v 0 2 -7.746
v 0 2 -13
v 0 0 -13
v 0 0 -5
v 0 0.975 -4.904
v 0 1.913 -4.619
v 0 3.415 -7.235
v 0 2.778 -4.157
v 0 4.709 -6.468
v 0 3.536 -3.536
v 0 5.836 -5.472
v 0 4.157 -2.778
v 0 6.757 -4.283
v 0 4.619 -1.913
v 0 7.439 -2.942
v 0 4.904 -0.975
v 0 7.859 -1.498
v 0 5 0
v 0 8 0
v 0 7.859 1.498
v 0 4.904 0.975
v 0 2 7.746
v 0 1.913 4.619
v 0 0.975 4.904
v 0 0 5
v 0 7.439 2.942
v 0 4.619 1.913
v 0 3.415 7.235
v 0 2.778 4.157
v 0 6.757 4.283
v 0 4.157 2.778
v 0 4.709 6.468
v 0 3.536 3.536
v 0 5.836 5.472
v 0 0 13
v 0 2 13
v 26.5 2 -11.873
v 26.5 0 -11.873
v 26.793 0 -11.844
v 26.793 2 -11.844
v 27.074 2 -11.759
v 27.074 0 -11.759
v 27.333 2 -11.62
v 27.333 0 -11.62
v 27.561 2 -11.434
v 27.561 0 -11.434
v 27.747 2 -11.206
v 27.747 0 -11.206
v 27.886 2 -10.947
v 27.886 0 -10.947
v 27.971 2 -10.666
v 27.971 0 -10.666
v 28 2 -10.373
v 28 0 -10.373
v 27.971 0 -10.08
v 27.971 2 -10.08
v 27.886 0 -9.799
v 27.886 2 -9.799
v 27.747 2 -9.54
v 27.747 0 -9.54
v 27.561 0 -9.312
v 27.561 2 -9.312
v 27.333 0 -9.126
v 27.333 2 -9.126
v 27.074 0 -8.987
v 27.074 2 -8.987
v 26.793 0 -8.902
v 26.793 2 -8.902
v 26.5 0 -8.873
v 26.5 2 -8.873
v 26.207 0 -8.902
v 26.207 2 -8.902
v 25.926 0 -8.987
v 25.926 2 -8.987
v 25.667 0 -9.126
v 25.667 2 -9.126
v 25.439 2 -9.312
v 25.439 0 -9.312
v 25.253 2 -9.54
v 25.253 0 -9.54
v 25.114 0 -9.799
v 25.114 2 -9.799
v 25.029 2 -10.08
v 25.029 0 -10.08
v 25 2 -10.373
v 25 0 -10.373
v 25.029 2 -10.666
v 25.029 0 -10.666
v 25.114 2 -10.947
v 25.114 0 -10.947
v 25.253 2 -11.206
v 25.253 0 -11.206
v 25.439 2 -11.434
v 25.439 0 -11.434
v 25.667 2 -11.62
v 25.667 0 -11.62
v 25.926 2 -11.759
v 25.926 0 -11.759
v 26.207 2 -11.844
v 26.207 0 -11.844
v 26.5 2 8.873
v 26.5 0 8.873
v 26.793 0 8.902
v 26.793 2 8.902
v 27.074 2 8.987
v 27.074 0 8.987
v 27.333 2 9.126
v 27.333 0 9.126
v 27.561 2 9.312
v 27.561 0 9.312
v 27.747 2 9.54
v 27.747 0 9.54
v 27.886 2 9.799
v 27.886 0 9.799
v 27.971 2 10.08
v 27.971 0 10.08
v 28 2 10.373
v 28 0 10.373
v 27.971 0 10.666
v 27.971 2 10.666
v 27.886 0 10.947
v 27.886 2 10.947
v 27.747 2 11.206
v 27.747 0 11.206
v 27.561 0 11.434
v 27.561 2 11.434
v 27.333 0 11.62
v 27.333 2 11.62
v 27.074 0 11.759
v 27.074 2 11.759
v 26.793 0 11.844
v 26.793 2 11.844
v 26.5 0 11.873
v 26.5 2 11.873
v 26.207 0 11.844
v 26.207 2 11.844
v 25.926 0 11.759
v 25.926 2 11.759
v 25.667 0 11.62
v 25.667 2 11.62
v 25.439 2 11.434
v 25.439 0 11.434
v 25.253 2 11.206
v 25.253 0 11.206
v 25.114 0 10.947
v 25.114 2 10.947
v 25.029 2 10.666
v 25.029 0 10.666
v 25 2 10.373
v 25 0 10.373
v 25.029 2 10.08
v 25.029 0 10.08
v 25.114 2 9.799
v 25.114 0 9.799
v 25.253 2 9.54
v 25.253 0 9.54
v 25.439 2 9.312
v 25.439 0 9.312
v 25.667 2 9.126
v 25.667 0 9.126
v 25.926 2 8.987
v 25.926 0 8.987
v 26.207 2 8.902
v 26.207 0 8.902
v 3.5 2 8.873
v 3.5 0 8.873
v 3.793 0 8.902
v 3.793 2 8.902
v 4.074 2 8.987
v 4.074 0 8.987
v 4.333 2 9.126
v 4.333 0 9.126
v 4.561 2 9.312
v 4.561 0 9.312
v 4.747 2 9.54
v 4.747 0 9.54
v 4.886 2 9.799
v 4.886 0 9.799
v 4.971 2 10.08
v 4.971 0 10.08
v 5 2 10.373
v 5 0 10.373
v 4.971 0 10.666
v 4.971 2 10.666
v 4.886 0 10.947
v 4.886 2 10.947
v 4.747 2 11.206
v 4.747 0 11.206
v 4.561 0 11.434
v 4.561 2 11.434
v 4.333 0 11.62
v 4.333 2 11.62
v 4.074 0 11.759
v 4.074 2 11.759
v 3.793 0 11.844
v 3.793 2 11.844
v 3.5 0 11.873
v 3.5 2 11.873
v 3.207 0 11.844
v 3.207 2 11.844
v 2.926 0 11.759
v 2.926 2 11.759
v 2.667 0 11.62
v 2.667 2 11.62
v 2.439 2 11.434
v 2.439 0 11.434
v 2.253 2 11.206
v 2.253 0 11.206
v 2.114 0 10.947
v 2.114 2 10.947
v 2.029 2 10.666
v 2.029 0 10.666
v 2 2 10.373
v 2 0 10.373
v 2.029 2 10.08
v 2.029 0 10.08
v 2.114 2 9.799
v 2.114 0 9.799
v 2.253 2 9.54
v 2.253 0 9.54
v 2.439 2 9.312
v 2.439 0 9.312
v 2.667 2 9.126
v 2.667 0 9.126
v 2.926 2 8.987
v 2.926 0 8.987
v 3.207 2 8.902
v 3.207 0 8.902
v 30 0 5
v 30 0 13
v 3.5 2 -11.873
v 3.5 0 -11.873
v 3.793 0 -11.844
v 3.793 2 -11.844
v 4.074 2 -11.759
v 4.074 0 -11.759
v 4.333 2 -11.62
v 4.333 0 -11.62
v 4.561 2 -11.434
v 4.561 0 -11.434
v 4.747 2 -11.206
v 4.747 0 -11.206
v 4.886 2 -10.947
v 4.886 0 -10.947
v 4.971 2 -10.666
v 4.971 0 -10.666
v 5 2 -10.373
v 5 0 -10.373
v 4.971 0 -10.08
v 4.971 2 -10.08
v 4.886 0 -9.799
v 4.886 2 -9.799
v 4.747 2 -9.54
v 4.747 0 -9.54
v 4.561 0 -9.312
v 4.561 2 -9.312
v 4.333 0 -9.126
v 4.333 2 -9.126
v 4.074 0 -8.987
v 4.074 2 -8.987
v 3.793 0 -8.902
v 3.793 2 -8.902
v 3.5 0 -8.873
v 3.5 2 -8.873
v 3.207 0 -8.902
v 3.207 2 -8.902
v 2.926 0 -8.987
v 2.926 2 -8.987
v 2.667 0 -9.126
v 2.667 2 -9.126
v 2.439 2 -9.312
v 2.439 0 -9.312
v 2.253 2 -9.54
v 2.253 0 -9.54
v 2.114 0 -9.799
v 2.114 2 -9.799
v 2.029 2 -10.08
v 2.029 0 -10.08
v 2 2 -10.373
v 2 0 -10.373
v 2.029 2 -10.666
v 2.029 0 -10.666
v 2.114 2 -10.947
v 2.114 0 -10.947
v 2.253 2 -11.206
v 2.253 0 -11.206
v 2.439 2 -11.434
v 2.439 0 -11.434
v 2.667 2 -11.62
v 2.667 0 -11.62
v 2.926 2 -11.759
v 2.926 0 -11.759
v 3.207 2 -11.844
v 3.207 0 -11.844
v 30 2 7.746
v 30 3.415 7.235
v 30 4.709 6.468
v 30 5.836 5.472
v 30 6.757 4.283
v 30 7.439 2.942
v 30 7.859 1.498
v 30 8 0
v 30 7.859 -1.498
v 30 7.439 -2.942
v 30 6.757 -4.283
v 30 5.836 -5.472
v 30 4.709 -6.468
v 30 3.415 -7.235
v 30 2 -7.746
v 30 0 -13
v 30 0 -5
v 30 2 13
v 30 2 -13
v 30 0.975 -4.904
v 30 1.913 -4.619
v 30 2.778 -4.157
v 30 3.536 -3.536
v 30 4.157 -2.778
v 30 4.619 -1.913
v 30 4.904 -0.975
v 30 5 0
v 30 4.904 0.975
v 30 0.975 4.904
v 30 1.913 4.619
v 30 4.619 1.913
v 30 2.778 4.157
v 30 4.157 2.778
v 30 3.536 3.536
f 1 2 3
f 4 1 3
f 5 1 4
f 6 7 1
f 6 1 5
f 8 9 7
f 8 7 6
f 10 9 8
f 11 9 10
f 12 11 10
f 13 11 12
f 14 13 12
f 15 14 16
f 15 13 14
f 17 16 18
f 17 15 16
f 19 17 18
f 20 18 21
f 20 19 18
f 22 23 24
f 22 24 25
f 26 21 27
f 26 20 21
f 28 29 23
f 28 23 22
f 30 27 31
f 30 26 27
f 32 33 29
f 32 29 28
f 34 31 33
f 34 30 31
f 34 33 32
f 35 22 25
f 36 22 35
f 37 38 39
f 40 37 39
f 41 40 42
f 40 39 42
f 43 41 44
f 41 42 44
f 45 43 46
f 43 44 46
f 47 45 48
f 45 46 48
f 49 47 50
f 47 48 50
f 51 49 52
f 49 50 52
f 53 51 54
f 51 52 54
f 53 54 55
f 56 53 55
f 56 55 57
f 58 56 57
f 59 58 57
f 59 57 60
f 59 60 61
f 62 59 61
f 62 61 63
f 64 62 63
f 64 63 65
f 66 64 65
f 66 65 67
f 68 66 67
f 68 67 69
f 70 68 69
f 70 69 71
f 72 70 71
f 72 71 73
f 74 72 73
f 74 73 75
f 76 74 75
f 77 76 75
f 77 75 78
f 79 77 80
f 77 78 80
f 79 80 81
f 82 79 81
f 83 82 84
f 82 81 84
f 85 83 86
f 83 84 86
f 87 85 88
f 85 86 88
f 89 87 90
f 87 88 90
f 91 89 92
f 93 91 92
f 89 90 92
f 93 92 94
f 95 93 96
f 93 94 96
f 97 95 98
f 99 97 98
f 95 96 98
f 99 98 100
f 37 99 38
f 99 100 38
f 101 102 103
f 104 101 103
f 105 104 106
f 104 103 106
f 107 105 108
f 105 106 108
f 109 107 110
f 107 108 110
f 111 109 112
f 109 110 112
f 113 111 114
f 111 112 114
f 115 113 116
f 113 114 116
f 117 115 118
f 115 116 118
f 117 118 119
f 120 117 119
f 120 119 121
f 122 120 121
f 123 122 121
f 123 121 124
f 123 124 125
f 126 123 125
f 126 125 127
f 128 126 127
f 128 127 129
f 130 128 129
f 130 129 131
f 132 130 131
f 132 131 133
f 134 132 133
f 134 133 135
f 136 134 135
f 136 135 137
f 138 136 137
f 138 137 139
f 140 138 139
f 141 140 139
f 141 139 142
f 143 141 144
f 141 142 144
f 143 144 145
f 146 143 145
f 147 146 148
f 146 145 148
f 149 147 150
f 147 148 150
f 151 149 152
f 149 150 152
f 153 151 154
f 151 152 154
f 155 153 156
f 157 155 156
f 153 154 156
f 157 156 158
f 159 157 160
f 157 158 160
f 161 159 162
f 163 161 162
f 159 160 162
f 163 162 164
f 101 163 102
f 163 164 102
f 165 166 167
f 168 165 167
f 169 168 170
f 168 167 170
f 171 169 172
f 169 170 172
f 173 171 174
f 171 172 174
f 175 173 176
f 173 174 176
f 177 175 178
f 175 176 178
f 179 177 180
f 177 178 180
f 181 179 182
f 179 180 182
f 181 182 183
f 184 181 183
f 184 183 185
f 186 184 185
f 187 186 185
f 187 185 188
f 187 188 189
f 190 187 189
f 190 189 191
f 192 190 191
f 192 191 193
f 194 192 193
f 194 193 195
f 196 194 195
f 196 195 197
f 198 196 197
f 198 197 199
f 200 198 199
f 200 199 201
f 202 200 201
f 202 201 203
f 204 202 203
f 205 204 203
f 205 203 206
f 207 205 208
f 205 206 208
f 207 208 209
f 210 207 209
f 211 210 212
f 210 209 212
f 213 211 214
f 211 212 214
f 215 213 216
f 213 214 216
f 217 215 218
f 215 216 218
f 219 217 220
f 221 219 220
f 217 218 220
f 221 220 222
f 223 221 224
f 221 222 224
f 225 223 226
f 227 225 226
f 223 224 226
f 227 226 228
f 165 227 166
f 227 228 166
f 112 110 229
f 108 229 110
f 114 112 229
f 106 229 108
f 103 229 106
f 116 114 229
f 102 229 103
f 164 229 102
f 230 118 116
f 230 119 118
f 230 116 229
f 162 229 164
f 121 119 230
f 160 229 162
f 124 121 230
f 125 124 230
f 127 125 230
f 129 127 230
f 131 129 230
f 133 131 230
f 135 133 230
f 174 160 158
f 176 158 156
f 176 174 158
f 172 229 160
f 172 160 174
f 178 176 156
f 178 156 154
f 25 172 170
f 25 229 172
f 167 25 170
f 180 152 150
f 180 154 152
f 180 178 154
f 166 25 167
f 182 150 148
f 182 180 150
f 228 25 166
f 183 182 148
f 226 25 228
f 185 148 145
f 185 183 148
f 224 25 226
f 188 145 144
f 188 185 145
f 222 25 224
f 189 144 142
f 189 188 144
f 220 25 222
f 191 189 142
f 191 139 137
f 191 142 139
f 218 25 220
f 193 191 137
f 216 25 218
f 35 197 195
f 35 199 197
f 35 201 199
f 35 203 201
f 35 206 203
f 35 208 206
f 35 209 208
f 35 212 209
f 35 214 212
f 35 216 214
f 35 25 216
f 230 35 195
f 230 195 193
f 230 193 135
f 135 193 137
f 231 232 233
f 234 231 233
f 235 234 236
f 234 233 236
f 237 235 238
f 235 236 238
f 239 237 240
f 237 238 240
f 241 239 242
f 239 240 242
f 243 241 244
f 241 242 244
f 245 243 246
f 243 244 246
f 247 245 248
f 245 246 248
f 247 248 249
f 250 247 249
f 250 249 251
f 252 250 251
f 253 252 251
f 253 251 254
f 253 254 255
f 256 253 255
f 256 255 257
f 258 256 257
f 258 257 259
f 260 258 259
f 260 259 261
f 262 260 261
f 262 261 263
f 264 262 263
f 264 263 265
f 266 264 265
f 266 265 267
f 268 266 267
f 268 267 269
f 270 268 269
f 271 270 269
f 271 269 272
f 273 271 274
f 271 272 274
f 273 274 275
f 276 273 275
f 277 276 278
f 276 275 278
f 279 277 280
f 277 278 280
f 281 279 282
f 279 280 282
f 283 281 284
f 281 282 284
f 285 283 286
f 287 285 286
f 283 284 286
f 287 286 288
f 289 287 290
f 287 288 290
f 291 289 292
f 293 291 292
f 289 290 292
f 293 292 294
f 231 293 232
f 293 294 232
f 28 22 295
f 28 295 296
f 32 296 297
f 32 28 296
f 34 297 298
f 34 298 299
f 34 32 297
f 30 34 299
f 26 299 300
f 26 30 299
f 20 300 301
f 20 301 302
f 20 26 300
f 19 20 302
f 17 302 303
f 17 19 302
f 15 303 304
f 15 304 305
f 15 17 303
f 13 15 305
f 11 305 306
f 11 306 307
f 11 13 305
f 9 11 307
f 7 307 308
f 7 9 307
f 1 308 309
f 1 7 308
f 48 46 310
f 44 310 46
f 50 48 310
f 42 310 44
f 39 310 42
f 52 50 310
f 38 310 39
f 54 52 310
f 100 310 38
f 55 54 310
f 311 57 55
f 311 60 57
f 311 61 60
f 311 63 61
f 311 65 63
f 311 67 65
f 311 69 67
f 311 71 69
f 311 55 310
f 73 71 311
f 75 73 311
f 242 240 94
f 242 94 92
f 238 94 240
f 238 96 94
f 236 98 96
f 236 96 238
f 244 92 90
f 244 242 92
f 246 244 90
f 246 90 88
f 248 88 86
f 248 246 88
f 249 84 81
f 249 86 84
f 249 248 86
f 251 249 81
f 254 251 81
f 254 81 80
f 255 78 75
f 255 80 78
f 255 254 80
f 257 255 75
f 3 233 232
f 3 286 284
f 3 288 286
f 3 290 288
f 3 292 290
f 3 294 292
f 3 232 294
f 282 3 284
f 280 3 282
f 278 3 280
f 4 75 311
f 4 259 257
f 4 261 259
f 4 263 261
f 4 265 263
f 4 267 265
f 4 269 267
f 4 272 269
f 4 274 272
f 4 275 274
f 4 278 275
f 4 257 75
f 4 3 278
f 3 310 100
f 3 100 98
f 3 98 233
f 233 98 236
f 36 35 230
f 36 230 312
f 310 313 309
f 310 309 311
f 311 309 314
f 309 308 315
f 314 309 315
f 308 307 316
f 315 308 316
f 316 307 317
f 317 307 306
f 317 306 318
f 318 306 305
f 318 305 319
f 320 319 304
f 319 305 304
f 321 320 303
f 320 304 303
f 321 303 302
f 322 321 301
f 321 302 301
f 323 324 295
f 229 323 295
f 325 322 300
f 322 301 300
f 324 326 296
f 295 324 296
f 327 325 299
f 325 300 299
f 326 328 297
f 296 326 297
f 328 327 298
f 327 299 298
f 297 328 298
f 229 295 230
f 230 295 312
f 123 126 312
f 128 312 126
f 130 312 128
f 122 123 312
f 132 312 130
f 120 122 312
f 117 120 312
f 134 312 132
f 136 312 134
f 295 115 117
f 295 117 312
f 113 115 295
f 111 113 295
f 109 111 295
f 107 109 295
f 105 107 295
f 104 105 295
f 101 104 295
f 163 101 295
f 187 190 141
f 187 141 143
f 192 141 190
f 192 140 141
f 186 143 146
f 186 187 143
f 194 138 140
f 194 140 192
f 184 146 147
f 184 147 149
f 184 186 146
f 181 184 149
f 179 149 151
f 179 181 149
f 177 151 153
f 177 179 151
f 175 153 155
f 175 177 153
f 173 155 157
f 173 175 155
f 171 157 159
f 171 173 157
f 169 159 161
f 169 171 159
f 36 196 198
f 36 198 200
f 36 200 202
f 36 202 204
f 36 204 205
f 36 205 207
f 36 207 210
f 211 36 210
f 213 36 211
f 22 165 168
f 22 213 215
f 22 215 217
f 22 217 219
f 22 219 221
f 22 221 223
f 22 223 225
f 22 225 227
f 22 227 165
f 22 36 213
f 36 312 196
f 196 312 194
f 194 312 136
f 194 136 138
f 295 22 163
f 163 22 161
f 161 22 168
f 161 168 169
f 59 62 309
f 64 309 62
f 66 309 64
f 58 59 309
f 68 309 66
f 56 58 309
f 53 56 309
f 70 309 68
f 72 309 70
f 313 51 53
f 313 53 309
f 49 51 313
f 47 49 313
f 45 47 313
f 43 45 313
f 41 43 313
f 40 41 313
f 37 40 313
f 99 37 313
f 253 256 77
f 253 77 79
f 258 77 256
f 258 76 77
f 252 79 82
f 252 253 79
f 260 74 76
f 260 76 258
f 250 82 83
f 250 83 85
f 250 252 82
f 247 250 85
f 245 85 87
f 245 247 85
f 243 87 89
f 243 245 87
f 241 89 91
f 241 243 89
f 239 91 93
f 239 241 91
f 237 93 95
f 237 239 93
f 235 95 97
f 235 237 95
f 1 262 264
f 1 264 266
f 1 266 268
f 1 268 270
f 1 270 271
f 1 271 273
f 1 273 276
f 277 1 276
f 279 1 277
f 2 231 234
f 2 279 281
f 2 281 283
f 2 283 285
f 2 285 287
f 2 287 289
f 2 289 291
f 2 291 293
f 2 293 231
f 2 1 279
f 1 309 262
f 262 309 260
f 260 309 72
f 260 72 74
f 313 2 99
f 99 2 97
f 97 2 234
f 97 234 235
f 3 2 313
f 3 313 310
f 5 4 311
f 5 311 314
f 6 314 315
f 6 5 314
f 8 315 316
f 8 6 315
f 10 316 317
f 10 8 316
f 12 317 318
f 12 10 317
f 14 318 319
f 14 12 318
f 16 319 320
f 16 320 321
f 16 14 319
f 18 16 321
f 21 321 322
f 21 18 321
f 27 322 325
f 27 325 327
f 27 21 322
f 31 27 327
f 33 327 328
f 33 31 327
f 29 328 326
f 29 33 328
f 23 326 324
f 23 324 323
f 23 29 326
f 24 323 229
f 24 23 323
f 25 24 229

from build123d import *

# Parameters (mm, degrees)
EXTRUDE_1_DEPTH     = 30
SKETCH_2_R          = 1.5
CUT_EXTRUDE_1_DEPTH = 10


with BuildPart() as part:
    # 草图1 → 凸台-拉伸1 (new body)
    with BuildSketch(Plane(origin=(0, 0, 0), x_dir=(0, 0, -1), z_dir=(1, 0, 0))):
        with BuildLine():
            Line((-5, 0), (-13, 0))
            Line((-13, 0), (-13, 2))
            Line((-13, 2), (-7.745966692, 2))
            ThreePointArc((-7.745966692, 2), (0, 8), (7.745966692, 2))
            Line((7.745966692, 2), (13, 2))
            Line((13, 2), (13, 0))
            Line((13, 0), (5, 0))
            ThreePointArc((5, 0), (0, 5), (-5, 0))
        make_face()
    extrude(amount=EXTRUDE_1_DEPTH)

    # 草图2 → 切除-拉伸1 (cut)
    with BuildSketch(Plane.XZ):
        with Locations(Location((26.5, -10.372983346, 0), (0, 0, 270))):
            Circle(SKETCH_2_R)
        with Locations(Location((3.5, -10.372983346, 0), (0, 0, 270))):
            Circle(SKETCH_2_R)
        with Locations(Location((3.5, 10.372983346, 0), (0, 0, 270))):
            Circle(SKETCH_2_R)
        with Locations(Location((26.5, 10.372983346, 0), (0, 0, 270))):
            Circle(SKETCH_2_R)
    extrude(amount=-CUT_EXTRUDE_1_DEPTH, mode=Mode.SUBTRACT)


solid = part.part
